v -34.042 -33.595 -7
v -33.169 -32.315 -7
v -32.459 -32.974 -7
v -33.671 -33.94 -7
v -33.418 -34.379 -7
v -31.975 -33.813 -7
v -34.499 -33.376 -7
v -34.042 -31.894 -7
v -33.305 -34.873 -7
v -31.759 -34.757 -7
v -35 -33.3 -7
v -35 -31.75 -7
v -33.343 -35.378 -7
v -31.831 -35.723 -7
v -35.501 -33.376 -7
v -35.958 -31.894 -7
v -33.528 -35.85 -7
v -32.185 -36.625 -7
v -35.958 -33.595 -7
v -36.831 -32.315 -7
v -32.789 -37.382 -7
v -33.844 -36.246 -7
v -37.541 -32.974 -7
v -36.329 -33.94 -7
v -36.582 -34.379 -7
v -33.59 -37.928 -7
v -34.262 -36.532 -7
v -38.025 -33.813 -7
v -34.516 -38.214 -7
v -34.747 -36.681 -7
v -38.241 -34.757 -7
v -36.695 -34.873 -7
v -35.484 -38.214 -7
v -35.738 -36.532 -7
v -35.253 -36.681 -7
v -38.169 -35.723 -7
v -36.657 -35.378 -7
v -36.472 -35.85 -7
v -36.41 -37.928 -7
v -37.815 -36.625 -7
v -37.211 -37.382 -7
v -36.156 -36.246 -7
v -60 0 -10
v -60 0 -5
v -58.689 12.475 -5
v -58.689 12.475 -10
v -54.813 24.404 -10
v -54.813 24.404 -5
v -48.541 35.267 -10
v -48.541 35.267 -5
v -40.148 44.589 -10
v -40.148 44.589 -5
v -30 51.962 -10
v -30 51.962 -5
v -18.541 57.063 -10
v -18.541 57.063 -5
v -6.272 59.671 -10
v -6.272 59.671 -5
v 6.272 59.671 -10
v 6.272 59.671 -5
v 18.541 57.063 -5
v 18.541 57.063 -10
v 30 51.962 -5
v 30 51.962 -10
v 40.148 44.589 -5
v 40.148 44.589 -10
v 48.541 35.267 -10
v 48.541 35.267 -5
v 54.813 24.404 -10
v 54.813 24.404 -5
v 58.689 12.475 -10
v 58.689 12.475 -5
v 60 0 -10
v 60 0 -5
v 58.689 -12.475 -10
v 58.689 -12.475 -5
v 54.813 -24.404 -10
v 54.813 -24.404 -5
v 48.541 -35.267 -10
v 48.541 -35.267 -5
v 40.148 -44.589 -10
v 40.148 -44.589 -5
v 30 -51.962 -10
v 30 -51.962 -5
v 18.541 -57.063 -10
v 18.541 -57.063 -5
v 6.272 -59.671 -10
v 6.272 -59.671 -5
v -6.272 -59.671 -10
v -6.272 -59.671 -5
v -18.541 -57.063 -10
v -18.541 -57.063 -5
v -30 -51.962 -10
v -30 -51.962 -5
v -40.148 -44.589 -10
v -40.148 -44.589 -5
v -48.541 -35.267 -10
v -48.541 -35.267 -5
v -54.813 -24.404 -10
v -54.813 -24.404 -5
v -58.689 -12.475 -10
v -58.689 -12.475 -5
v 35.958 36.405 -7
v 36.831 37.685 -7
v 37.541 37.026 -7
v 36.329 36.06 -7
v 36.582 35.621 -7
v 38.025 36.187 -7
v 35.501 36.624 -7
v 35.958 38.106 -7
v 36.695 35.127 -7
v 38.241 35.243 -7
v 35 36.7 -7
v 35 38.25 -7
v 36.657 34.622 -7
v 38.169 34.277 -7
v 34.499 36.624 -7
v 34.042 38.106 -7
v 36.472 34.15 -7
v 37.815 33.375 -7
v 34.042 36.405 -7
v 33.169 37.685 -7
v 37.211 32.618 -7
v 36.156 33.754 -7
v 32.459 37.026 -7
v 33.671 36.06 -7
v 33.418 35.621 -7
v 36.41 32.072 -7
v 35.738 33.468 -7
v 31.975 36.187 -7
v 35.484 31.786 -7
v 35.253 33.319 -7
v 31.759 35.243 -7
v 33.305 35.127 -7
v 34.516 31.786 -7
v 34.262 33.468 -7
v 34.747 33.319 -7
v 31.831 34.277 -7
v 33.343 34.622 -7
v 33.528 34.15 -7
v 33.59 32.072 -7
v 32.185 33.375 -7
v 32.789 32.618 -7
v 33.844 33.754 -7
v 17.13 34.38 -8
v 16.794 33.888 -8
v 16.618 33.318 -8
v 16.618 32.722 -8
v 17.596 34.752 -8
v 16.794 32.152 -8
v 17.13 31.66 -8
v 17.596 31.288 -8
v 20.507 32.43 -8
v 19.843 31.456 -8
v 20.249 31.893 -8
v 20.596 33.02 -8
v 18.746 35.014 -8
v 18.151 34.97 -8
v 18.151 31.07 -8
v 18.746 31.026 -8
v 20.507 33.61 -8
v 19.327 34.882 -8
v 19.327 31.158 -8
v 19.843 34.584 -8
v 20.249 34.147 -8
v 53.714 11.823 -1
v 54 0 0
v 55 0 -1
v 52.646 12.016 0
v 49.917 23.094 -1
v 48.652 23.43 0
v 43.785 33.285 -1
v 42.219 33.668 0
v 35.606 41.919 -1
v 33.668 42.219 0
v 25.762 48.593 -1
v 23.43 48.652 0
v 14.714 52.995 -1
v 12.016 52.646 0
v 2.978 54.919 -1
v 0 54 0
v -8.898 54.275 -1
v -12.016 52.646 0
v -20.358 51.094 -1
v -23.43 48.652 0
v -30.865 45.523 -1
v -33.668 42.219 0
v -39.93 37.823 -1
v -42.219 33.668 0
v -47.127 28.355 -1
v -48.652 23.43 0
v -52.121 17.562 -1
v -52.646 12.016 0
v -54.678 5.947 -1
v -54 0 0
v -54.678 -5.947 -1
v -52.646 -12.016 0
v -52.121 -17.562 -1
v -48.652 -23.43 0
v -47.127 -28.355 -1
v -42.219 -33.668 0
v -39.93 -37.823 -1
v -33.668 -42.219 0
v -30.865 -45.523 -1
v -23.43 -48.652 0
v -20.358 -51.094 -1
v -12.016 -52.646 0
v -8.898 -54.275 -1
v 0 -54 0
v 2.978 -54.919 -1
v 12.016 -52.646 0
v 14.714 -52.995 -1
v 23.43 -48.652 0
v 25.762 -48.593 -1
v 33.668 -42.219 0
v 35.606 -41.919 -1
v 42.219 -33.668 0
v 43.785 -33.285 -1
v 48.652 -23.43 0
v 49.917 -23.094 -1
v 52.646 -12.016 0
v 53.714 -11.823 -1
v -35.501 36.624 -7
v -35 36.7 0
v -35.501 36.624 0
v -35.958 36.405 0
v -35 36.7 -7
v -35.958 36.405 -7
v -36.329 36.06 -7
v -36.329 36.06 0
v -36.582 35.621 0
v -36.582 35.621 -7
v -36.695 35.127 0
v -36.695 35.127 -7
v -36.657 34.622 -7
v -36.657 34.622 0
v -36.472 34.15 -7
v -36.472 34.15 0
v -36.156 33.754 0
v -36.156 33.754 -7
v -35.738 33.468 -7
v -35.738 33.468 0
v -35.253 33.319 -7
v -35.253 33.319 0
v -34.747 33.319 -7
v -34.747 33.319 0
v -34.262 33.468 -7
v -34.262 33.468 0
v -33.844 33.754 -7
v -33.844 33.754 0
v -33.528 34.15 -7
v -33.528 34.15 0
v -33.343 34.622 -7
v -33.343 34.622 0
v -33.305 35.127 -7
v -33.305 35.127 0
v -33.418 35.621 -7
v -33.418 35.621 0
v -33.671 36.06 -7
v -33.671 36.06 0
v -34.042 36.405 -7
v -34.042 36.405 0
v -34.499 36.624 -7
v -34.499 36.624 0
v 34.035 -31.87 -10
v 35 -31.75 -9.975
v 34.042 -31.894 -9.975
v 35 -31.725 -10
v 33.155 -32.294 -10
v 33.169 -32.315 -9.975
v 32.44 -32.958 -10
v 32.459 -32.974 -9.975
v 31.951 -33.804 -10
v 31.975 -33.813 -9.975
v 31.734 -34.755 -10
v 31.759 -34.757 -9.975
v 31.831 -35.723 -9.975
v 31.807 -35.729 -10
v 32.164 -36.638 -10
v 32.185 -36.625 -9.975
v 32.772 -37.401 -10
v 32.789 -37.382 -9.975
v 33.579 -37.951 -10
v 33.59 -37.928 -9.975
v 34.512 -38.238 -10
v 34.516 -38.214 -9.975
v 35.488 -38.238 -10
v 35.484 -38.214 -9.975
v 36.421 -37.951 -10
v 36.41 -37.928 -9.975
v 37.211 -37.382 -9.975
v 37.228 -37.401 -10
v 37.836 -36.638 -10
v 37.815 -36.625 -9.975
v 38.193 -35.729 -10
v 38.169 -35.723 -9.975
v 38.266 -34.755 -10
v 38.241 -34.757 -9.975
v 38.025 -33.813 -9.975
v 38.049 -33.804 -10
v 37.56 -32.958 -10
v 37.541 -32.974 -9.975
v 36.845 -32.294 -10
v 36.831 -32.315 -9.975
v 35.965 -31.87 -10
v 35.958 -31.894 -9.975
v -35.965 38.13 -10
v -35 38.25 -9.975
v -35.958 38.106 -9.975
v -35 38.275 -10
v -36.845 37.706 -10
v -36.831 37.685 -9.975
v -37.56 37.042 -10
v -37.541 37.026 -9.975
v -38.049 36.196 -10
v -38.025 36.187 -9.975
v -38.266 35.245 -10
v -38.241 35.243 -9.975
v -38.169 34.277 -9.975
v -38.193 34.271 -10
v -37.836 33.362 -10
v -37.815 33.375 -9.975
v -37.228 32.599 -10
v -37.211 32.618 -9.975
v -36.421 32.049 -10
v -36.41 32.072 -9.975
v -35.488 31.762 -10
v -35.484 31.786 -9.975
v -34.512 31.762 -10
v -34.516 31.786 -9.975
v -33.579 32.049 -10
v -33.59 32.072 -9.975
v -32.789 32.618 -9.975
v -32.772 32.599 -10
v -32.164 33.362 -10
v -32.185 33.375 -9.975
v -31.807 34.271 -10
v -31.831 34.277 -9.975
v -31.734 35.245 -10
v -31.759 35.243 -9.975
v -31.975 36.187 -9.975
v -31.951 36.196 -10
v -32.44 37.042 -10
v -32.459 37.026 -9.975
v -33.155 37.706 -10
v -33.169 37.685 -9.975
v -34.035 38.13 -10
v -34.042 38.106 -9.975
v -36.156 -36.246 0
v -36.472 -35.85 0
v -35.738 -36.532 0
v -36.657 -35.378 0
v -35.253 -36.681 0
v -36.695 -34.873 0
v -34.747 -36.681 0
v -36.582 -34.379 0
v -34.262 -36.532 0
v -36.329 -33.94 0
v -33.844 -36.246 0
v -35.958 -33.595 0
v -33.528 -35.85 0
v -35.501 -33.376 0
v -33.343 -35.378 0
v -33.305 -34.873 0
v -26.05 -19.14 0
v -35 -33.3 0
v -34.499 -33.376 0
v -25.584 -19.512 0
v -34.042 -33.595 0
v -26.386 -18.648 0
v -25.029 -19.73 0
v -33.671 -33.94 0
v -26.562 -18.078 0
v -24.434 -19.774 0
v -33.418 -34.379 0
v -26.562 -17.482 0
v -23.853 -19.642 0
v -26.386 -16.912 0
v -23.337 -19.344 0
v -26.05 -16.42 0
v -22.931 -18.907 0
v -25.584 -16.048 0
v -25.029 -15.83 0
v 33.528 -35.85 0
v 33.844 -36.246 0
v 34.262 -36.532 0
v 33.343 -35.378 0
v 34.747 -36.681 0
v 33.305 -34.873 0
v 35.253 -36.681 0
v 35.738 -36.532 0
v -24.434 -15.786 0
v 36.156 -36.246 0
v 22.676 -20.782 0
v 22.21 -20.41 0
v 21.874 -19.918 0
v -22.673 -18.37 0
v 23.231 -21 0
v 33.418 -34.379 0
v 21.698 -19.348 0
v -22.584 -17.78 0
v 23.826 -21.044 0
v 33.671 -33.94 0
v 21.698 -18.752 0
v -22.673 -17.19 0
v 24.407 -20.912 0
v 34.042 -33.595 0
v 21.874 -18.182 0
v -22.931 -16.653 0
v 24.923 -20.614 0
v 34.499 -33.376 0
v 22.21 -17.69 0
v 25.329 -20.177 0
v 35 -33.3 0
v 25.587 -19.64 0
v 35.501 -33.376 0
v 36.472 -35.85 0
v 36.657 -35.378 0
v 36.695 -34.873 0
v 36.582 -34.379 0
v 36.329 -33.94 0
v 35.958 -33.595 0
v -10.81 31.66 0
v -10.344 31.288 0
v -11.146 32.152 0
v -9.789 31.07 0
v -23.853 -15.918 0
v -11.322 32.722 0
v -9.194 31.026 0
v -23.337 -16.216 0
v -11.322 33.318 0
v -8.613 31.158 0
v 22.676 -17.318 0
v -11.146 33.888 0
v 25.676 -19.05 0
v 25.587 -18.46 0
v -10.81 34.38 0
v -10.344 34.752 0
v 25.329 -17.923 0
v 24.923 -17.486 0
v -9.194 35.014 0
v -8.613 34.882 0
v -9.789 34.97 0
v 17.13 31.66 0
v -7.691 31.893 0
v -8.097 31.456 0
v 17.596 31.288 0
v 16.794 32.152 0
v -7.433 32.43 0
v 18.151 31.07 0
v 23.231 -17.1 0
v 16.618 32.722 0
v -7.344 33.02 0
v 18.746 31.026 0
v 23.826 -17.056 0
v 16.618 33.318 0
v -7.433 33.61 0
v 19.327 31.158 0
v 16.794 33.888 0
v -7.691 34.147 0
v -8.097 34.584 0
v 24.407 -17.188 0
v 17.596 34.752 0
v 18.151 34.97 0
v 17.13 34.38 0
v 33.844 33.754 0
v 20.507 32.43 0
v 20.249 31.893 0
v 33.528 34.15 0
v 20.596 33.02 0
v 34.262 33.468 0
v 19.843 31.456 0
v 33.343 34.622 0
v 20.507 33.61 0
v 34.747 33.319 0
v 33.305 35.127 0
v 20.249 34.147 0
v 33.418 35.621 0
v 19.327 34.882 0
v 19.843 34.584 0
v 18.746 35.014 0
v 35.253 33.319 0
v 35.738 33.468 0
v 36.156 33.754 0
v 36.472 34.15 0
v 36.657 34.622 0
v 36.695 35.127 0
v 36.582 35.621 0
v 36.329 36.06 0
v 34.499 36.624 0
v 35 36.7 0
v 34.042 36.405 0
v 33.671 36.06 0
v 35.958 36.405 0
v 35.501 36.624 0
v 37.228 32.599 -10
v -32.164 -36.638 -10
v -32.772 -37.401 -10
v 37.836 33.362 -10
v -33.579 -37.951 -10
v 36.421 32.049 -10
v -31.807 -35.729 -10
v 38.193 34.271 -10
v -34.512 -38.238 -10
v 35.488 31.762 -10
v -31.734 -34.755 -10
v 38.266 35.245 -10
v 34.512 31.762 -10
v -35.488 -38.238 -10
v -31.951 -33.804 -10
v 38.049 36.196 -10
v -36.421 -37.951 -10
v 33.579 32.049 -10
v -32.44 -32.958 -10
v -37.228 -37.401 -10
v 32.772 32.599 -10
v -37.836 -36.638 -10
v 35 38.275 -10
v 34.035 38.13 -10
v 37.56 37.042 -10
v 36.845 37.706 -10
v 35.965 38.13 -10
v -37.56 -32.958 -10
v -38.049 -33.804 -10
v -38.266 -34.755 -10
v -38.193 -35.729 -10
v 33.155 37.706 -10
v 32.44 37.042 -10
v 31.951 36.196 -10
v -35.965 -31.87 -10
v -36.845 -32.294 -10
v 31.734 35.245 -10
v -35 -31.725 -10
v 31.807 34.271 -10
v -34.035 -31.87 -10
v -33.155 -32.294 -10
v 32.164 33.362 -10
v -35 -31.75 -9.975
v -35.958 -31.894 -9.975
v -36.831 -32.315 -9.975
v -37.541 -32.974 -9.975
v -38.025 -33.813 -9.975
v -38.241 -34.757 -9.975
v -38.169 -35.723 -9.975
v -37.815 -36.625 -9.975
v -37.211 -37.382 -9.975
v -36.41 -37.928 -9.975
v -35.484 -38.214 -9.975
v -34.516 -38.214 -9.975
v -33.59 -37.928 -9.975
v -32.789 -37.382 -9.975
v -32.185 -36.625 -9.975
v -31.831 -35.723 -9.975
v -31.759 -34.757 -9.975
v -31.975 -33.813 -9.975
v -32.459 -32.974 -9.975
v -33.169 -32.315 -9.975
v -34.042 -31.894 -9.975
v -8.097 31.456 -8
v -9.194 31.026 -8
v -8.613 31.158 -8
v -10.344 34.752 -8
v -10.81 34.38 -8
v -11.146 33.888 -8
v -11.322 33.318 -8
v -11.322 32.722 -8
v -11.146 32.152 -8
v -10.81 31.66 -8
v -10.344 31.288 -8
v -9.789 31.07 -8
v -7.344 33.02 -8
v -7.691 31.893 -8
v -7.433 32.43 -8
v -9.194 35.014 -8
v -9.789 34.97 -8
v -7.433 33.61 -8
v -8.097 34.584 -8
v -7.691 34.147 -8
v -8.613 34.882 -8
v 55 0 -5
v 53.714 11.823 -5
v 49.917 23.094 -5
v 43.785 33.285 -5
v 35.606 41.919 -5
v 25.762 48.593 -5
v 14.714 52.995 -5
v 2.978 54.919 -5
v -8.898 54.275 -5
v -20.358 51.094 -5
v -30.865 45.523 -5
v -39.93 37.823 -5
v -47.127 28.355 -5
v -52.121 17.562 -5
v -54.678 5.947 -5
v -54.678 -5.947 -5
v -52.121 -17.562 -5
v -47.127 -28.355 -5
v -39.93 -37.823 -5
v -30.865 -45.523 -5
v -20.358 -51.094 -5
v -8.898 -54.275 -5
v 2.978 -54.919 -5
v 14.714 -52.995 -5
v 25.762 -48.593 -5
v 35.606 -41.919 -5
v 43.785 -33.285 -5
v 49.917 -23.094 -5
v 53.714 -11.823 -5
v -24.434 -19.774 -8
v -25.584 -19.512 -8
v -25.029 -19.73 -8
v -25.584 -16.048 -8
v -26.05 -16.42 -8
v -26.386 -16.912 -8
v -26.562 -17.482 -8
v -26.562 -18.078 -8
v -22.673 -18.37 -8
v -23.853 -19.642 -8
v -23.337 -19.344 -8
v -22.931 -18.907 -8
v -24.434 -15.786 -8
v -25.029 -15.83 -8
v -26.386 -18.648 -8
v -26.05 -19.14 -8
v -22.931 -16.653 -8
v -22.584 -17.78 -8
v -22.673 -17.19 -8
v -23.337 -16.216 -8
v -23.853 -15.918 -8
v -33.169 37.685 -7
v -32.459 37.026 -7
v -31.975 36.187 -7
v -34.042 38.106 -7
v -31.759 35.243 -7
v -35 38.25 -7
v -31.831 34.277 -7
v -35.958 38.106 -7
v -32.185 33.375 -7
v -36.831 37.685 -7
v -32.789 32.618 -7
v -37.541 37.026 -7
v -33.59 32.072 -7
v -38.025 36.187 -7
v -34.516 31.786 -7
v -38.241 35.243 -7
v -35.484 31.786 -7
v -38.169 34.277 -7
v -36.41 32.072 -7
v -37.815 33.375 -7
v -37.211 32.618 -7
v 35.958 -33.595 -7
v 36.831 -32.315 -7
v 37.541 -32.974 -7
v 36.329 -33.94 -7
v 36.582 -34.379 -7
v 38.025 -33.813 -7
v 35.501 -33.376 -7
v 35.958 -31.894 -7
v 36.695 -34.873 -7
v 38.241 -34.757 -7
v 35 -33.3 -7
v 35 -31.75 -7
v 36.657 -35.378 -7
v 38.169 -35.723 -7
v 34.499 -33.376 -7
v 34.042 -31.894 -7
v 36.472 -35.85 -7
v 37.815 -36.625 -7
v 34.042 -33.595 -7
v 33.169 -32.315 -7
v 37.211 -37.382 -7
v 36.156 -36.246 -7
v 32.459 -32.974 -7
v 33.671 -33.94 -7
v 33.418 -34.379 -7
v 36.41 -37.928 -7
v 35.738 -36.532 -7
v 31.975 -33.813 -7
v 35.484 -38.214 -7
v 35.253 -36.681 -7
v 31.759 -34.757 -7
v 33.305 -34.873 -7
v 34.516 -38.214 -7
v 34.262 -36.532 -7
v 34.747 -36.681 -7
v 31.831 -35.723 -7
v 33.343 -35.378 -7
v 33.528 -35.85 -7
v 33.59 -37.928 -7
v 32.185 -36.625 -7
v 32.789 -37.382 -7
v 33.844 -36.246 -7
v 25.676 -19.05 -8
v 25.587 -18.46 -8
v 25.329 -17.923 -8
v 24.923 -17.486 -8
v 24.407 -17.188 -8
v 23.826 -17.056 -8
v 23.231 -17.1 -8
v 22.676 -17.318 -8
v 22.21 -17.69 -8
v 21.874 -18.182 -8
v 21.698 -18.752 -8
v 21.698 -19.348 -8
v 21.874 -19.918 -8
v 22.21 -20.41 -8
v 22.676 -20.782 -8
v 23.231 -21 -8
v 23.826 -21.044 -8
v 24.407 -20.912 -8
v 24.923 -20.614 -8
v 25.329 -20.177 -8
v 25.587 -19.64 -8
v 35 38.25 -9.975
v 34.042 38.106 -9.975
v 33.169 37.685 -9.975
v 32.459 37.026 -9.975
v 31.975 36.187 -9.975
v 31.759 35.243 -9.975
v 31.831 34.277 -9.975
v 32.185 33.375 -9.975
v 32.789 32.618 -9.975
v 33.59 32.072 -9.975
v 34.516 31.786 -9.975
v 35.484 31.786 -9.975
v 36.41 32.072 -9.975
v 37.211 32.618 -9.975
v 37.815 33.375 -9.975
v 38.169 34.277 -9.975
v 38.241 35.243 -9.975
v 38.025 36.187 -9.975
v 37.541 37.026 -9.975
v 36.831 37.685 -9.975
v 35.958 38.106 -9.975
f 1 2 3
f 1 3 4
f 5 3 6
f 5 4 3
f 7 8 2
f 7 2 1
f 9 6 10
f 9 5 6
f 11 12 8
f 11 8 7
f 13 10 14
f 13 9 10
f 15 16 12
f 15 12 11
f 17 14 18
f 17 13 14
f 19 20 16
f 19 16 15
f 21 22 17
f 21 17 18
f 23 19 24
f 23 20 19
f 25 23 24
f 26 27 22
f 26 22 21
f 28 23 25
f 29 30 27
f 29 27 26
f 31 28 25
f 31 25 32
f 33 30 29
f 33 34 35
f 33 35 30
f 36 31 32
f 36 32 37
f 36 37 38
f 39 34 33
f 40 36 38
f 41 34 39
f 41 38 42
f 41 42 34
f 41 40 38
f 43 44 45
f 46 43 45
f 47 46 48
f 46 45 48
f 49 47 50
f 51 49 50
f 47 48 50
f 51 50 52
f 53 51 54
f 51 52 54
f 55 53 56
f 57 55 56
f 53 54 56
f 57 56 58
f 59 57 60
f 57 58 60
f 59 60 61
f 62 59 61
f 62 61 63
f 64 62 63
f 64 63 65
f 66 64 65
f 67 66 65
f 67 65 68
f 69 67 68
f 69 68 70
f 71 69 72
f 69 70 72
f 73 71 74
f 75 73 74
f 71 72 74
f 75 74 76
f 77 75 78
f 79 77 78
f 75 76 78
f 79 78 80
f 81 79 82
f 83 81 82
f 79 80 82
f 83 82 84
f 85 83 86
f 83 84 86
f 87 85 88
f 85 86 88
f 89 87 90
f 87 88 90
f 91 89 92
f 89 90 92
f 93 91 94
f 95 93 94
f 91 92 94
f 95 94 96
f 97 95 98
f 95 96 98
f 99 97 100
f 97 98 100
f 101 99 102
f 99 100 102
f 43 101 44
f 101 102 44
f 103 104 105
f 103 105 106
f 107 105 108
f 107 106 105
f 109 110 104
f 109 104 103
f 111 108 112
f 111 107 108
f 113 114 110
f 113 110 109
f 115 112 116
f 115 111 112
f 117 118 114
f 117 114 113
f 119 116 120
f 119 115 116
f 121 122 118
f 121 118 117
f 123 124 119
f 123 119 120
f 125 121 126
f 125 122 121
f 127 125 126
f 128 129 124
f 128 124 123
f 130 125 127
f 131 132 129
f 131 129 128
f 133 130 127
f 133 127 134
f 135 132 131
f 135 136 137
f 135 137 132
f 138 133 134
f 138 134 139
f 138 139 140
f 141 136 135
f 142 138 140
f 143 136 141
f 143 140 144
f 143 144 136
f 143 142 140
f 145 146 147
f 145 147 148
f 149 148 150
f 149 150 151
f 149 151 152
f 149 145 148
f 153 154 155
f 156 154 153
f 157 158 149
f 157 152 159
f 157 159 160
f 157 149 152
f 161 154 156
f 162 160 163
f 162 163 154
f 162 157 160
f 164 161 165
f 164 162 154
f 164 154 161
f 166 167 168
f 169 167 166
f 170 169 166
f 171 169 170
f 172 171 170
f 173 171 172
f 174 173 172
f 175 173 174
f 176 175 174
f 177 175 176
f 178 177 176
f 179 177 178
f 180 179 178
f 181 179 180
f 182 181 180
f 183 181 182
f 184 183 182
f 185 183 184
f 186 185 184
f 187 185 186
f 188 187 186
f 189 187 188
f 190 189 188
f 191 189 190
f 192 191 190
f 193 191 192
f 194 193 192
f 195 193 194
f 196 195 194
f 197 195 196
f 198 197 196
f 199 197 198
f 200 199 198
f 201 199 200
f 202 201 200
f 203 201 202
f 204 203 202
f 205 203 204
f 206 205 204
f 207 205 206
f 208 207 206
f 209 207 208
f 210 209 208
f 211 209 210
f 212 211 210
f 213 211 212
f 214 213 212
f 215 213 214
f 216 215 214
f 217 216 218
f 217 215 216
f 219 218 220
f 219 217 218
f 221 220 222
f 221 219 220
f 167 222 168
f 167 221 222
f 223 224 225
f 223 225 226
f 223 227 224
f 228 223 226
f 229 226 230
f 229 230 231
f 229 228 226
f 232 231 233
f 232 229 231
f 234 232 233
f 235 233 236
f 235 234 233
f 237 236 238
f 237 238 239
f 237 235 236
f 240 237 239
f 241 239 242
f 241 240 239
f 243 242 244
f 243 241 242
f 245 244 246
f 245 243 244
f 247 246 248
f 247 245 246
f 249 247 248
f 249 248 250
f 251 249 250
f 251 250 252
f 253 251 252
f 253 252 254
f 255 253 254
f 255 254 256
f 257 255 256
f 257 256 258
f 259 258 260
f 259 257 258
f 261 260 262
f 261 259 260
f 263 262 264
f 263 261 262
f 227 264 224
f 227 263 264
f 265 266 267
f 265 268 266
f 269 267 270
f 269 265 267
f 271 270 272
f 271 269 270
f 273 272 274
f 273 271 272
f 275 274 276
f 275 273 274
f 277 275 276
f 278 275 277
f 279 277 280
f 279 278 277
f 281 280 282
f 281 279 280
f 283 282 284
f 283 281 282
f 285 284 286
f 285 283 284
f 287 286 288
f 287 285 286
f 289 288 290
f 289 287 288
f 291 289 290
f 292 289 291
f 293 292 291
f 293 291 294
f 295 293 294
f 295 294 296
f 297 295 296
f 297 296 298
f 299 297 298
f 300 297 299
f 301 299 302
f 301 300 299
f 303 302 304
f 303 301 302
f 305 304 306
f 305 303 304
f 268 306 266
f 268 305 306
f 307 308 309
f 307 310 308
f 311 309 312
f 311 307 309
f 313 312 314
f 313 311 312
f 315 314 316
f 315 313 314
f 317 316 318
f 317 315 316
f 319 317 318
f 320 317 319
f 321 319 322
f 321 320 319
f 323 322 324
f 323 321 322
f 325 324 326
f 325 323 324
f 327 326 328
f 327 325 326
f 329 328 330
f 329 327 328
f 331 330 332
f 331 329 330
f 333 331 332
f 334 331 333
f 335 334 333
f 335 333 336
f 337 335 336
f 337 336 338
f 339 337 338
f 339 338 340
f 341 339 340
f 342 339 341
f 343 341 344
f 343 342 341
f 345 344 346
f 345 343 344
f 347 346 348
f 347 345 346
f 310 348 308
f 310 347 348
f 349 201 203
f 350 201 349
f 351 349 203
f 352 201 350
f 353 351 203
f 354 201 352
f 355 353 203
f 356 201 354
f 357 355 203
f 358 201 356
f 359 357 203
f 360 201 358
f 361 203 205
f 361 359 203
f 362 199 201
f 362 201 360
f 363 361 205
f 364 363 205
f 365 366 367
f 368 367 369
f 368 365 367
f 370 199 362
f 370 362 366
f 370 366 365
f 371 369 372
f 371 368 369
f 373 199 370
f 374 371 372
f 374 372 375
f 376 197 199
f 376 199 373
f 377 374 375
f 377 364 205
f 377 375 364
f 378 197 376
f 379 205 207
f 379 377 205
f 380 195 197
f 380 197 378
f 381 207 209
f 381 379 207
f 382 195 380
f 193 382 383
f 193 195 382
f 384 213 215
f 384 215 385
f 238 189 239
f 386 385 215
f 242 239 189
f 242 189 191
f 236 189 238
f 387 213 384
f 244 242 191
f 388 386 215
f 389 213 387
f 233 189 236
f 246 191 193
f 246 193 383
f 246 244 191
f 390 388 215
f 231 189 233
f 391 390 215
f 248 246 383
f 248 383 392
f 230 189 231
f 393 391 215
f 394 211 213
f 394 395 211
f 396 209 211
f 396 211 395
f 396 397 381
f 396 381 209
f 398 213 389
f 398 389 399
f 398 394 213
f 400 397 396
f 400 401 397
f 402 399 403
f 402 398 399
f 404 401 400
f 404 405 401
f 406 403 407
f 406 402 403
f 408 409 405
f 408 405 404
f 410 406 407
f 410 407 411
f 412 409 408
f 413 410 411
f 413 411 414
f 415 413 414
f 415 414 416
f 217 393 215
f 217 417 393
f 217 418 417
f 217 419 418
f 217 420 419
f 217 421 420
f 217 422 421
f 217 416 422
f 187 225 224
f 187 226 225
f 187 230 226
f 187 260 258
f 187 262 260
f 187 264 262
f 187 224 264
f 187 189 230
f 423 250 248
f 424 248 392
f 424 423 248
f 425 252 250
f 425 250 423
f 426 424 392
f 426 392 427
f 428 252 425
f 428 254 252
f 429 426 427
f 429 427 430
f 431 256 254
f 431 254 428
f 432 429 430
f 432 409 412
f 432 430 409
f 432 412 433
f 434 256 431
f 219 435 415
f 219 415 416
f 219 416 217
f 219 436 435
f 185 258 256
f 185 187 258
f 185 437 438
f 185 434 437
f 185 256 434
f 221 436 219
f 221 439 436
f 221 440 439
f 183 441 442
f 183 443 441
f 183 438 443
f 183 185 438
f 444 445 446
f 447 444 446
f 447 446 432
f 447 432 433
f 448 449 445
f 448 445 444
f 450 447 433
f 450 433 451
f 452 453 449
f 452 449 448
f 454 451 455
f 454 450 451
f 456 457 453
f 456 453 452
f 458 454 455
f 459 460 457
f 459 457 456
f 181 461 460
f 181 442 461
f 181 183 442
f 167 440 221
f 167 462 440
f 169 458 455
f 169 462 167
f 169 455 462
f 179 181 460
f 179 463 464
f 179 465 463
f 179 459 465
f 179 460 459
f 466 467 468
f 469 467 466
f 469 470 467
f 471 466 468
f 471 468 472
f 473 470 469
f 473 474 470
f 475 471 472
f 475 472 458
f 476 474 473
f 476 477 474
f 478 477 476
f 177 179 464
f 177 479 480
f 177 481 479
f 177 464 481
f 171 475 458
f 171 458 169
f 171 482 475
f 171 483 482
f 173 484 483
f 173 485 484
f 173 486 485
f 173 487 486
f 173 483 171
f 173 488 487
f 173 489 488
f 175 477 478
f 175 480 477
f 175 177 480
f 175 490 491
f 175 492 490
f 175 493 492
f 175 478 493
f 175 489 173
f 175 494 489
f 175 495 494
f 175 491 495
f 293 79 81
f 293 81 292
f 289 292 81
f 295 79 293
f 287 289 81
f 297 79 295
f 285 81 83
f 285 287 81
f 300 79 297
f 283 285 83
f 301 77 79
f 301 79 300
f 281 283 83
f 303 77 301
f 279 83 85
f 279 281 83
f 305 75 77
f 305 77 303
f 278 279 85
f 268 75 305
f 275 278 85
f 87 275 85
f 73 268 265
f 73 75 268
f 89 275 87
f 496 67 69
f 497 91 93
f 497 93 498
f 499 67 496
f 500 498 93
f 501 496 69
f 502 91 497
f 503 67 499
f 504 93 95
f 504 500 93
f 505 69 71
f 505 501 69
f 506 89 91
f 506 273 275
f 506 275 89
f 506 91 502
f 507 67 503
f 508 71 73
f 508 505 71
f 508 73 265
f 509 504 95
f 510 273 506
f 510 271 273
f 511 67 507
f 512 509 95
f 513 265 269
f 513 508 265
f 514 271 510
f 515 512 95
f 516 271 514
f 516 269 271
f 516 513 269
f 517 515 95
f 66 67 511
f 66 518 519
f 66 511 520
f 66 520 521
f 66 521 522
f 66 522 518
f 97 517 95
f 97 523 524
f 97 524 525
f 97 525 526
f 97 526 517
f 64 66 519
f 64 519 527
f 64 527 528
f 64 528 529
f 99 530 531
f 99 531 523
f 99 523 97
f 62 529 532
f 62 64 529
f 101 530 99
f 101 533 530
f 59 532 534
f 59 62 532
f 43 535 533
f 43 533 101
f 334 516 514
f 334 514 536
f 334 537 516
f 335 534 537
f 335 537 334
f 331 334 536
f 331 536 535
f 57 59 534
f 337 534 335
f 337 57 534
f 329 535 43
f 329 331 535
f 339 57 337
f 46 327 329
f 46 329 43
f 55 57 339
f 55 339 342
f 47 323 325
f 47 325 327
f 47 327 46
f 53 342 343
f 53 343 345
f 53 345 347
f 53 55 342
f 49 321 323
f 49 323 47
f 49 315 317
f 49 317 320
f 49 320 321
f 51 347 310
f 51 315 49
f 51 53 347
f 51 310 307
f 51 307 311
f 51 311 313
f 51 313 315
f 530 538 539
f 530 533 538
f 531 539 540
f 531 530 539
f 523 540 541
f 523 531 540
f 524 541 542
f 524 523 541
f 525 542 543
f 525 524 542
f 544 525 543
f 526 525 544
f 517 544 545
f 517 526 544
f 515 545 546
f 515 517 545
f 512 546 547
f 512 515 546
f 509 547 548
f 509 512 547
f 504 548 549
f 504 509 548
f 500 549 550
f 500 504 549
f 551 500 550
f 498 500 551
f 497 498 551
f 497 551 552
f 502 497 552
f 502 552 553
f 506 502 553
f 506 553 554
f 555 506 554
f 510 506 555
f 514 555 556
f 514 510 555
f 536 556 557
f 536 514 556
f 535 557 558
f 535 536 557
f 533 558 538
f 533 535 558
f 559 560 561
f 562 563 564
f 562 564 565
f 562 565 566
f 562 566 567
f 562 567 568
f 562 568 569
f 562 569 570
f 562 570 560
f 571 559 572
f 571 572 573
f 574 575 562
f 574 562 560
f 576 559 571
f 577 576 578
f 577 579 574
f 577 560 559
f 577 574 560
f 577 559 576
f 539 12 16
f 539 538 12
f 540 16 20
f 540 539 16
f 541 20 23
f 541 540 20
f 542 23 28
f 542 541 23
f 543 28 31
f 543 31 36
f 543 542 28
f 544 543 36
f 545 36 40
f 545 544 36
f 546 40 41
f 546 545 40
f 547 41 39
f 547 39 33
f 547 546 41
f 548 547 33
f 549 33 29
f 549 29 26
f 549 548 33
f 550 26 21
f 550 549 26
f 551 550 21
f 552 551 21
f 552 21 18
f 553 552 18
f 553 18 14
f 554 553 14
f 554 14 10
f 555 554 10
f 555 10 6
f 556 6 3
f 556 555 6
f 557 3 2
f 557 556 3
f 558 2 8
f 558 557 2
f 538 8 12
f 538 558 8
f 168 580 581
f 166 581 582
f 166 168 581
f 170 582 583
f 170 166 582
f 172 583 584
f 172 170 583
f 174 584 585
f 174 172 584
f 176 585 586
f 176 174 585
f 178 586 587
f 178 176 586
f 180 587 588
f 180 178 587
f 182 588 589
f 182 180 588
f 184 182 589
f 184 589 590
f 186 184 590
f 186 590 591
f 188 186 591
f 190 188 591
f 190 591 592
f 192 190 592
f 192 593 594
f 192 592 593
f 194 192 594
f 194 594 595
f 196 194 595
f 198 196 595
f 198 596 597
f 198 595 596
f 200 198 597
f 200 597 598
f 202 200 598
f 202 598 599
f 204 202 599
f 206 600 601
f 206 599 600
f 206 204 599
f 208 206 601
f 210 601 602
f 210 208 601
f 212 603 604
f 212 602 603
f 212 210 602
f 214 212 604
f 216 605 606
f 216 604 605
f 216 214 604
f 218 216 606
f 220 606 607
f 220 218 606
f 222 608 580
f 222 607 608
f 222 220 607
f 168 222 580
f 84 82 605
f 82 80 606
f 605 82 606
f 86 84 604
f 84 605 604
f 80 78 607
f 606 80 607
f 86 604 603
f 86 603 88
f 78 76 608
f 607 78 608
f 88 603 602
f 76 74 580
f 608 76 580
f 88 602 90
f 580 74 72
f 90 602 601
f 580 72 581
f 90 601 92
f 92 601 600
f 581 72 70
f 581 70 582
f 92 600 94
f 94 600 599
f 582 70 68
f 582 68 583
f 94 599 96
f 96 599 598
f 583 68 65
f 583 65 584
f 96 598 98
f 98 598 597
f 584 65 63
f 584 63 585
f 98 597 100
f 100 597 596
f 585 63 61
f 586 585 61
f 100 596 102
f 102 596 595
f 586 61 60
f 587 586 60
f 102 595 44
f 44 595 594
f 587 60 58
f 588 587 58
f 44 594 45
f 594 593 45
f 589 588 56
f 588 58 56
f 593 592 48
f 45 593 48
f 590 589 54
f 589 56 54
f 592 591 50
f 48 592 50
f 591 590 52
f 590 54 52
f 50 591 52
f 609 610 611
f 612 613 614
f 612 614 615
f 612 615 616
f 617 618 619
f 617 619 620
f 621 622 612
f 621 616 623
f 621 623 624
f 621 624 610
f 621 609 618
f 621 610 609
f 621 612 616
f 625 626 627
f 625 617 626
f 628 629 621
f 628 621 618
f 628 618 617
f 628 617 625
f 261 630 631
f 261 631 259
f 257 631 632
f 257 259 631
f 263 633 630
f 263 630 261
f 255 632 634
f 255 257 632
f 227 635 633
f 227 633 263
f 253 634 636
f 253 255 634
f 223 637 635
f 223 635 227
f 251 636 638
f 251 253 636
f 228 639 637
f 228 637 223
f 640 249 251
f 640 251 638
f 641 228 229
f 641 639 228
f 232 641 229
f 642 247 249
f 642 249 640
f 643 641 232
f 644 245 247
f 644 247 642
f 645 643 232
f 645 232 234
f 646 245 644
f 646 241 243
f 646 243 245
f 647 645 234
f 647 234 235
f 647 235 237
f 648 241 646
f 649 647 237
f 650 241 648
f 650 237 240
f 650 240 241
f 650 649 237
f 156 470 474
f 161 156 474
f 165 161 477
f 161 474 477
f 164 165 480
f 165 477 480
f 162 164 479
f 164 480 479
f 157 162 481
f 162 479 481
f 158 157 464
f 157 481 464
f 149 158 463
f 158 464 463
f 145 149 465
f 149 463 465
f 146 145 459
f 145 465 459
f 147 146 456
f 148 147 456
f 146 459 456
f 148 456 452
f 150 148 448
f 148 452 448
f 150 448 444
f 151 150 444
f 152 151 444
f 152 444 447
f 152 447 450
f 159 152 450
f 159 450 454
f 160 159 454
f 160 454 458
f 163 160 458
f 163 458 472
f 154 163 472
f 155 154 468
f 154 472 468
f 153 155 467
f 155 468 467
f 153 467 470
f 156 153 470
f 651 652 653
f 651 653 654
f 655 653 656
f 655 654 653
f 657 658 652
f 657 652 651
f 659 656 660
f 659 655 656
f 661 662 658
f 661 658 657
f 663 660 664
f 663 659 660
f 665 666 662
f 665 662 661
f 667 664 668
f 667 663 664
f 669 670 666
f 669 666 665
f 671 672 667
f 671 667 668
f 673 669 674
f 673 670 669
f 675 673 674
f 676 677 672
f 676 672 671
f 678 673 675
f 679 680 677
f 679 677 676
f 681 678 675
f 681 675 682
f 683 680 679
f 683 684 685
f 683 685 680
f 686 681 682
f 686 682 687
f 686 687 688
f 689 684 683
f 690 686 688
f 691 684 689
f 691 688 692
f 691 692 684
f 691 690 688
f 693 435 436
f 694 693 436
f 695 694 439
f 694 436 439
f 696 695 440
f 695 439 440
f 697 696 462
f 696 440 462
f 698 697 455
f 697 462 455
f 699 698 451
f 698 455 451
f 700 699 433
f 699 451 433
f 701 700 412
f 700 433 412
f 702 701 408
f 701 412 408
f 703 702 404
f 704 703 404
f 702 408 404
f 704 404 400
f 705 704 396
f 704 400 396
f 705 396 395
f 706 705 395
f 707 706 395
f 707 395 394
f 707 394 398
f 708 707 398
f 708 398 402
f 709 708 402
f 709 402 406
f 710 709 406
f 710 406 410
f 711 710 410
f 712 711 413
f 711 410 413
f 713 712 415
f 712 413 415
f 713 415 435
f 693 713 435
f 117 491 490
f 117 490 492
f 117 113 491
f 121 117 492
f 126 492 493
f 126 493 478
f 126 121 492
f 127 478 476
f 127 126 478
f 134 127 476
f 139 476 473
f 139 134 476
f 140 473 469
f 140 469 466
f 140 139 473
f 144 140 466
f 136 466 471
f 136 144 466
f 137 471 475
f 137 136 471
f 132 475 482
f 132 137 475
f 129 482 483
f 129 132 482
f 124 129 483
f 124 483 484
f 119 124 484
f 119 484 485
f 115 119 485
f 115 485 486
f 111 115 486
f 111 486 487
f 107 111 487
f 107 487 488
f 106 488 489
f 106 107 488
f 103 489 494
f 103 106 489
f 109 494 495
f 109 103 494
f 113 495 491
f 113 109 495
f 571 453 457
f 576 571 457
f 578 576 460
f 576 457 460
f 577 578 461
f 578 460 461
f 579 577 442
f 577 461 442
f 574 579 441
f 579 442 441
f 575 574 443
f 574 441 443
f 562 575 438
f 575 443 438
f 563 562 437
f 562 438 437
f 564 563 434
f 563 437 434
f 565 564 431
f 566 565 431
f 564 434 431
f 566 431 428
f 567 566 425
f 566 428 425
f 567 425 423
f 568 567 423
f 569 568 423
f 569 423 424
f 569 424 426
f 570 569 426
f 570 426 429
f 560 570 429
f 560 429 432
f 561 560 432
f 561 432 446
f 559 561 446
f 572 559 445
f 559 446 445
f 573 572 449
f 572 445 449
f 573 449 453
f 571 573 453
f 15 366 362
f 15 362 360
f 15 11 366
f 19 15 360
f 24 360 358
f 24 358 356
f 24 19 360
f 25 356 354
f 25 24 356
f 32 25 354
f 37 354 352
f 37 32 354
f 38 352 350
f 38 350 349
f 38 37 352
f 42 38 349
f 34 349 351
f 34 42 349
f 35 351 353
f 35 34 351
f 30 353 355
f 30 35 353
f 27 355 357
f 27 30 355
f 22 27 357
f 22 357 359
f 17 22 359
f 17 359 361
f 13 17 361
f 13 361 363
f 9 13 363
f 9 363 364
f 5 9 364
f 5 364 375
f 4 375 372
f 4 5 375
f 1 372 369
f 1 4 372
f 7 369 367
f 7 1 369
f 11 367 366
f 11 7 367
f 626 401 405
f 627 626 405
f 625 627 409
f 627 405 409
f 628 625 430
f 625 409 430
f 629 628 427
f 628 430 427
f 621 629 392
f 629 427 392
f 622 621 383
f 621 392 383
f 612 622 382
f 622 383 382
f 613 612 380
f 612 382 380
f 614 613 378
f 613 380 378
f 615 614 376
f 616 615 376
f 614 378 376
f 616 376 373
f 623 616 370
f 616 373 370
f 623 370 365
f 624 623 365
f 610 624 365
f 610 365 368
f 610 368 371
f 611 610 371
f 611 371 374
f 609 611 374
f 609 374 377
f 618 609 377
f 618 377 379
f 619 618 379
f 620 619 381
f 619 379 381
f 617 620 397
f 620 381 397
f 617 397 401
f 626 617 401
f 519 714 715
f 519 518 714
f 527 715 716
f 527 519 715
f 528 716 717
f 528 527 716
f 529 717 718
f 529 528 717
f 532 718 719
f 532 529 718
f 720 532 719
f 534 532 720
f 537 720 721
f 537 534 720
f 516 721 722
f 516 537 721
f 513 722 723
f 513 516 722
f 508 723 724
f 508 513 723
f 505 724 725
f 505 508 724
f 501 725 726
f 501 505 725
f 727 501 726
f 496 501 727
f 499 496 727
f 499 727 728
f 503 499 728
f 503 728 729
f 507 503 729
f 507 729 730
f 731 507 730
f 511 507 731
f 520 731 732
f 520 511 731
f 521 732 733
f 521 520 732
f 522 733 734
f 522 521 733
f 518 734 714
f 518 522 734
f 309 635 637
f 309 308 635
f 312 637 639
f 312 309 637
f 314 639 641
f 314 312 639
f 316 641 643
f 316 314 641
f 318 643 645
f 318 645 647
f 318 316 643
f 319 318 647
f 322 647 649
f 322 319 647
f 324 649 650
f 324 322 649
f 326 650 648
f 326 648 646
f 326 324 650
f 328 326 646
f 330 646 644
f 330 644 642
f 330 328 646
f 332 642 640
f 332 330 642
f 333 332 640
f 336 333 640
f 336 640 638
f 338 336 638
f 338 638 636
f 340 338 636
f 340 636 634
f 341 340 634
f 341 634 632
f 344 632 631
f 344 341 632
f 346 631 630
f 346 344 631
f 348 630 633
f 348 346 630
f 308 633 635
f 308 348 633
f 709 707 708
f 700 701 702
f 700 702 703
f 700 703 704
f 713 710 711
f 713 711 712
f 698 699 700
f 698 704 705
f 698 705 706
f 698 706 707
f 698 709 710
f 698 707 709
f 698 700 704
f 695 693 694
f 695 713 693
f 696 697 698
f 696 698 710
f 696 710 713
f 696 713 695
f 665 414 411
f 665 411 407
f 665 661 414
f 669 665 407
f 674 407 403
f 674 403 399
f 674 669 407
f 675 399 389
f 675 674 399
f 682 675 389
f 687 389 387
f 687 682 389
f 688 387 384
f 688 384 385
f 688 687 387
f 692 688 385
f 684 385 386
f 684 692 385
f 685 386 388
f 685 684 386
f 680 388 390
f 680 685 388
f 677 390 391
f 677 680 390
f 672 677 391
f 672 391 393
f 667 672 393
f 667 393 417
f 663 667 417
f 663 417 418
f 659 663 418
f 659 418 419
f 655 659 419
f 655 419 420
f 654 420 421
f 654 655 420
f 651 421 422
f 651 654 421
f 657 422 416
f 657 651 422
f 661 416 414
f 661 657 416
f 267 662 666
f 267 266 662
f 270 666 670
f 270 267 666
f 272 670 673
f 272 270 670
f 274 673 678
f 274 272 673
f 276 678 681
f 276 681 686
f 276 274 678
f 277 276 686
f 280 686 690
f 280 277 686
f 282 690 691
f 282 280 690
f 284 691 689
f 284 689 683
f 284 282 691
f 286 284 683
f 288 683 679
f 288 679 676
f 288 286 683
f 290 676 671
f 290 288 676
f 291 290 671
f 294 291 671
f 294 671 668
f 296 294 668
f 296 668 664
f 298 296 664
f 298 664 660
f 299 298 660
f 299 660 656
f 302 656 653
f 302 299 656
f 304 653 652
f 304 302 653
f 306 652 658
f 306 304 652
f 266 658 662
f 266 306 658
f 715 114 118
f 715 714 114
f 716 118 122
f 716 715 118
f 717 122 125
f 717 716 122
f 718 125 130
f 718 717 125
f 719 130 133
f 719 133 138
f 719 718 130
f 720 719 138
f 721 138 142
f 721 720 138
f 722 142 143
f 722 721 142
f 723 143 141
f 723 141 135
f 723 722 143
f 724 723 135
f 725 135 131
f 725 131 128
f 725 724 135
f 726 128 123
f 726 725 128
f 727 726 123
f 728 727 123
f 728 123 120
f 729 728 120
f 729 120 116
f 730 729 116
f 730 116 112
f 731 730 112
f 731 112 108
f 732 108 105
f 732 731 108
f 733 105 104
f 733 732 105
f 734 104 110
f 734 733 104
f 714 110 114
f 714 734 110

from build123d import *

# Parameters (mm, degrees)
SKETCH1_R                     = 55
BOSS_EXTRUDE1_DEPTH           = 10
SKETCH6_R                     = 50
BOSS_EXTRUDE3_DEPTH           = 5
SKETCH9_R                     = 2
CUT_EXTRUDE2_DEPTH            = 8
BOSS_EXTRUDE4_START           = -5
SKETCH24_R                    = 60
SKETCH24_R_2                  = 55
BOSS_EXTRUDE4_DEPTH           = 5
CBORE_FOR_M3_SHCS1_AT_2_COUNT = 2
CBORE_FOR_M3_SHCS1_AT_2_PITCH = 70
CBORE_FOR_M3_SHCS1_AT_3_COUNT = 2
CBORE_FOR_M3_SHCS1_AT_3_PITCH = 70
CBORE_FOR_M3_SHCS1_AT_4_COUNT = 2
CBORE_FOR_M3_SHCS1_AT_4_PITCH = 98.994949366
CHAMFER2_SIZE                 = 1


with BuildPart() as part:
    # Sketch1 → Boss-Extrude1 (new body)
    with BuildSketch(Plane.XY):
        Circle(SKETCH1_R)
    extrude(amount=-BOSS_EXTRUDE1_DEPTH)

    # Sketch6 → Boss-Extrude3 (add)
    with BuildSketch(Plane(origin=(0, 0, -10), x_dir=(-1, 0, 0), z_dir=(0, 0, -1))):
        Circle(SKETCH6_R)
    extrude(amount=-BOSS_EXTRUDE3_DEPTH)

    # Sketch9 → Cut-Extrude2 (cut)
    with BuildSketch(Plane.XY):
        with Locations((23.676144844, -19.05)):
            Circle(SKETCH9_R)
        with Locations((-24.583855156, -17.78)):
            Circle(SKETCH9_R)
        with Locations((18.596144844, 33.02)):
            Circle(SKETCH9_R)
        with Locations((-9.343855156, 33.02)):
            Circle(SKETCH9_R)
    extrude(amount=-CUT_EXTRUDE2_DEPTH, mode=Mode.SUBTRACT)

    # Sketch24 → Boss-Extrude4 (add)
    with BuildSketch(Plane(origin=(0, 0, -10), x_dir=(-1, 0, 0), z_dir=(0, 0, -1)).offset(BOSS_EXTRUDE4_START)):
        Circle(SKETCH24_R)
        with Locations(Location((0, 0, 0), (0, 0, 180))):
            Circle(SKETCH24_R_2, mode=Mode.SUBTRACT)
    extrude(amount=BOSS_EXTRUDE4_DEPTH)

    # Sketch26 → CBORE for M3 SHCS1 (revolve, cut)
    with BuildSketch(Plane(origin=(-35, -35, -10), x_dir=(0, 1, 0), z_dir=(1, 0, 0))):
        Polygon((0, 0), (0, 10), (1.7, 10), (1.7, 3), (3.25, 3), (3.25, 0.025), (3.275, 0), align=None)
    cbore_for_m3_shcs1 = revolve(axis=Axis((-35, -35, -16.35), (0, 0, 1)), mode=Mode.SUBTRACT)

    # CBORE for M3 SHCS1 at 2: CBORE for M3 SHCS1 ×2
    with Locations(*[(0, i * CBORE_FOR_M3_SHCS1_AT_2_PITCH, 0) for i in range(1, CBORE_FOR_M3_SHCS1_AT_2_COUNT)]):
        add(cbore_for_m3_shcs1, mode=Mode.SUBTRACT)

    # CBORE for M3 SHCS1 at 3: CBORE for M3 SHCS1 ×2
    with Locations(*[(i * CBORE_FOR_M3_SHCS1_AT_3_PITCH, 0, 0) for i in range(1, CBORE_FOR_M3_SHCS1_AT_3_COUNT)]):
        add(cbore_for_m3_shcs1, mode=Mode.SUBTRACT)

    # CBORE for M3 SHCS1 at 4: CBORE for M3 SHCS1 ×2
    with Locations(*[Vector(0.7071067811865476, 0.7071067811865476, 0) * (i * CBORE_FOR_M3_SHCS1_AT_4_PITCH) for i in range(1, CBORE_FOR_M3_SHCS1_AT_4_COUNT)]):
        add(cbore_for_m3_shcs1, mode=Mode.SUBTRACT)

    # Chamfer2
    chamfer2_edges = [part.edges().sort_by_distance(p)[0] for p in [
        (-55, 0, 0),
    ]]
    chamfer(chamfer2_edges, length=CHAMFER2_SIZE)


solid = part.part
